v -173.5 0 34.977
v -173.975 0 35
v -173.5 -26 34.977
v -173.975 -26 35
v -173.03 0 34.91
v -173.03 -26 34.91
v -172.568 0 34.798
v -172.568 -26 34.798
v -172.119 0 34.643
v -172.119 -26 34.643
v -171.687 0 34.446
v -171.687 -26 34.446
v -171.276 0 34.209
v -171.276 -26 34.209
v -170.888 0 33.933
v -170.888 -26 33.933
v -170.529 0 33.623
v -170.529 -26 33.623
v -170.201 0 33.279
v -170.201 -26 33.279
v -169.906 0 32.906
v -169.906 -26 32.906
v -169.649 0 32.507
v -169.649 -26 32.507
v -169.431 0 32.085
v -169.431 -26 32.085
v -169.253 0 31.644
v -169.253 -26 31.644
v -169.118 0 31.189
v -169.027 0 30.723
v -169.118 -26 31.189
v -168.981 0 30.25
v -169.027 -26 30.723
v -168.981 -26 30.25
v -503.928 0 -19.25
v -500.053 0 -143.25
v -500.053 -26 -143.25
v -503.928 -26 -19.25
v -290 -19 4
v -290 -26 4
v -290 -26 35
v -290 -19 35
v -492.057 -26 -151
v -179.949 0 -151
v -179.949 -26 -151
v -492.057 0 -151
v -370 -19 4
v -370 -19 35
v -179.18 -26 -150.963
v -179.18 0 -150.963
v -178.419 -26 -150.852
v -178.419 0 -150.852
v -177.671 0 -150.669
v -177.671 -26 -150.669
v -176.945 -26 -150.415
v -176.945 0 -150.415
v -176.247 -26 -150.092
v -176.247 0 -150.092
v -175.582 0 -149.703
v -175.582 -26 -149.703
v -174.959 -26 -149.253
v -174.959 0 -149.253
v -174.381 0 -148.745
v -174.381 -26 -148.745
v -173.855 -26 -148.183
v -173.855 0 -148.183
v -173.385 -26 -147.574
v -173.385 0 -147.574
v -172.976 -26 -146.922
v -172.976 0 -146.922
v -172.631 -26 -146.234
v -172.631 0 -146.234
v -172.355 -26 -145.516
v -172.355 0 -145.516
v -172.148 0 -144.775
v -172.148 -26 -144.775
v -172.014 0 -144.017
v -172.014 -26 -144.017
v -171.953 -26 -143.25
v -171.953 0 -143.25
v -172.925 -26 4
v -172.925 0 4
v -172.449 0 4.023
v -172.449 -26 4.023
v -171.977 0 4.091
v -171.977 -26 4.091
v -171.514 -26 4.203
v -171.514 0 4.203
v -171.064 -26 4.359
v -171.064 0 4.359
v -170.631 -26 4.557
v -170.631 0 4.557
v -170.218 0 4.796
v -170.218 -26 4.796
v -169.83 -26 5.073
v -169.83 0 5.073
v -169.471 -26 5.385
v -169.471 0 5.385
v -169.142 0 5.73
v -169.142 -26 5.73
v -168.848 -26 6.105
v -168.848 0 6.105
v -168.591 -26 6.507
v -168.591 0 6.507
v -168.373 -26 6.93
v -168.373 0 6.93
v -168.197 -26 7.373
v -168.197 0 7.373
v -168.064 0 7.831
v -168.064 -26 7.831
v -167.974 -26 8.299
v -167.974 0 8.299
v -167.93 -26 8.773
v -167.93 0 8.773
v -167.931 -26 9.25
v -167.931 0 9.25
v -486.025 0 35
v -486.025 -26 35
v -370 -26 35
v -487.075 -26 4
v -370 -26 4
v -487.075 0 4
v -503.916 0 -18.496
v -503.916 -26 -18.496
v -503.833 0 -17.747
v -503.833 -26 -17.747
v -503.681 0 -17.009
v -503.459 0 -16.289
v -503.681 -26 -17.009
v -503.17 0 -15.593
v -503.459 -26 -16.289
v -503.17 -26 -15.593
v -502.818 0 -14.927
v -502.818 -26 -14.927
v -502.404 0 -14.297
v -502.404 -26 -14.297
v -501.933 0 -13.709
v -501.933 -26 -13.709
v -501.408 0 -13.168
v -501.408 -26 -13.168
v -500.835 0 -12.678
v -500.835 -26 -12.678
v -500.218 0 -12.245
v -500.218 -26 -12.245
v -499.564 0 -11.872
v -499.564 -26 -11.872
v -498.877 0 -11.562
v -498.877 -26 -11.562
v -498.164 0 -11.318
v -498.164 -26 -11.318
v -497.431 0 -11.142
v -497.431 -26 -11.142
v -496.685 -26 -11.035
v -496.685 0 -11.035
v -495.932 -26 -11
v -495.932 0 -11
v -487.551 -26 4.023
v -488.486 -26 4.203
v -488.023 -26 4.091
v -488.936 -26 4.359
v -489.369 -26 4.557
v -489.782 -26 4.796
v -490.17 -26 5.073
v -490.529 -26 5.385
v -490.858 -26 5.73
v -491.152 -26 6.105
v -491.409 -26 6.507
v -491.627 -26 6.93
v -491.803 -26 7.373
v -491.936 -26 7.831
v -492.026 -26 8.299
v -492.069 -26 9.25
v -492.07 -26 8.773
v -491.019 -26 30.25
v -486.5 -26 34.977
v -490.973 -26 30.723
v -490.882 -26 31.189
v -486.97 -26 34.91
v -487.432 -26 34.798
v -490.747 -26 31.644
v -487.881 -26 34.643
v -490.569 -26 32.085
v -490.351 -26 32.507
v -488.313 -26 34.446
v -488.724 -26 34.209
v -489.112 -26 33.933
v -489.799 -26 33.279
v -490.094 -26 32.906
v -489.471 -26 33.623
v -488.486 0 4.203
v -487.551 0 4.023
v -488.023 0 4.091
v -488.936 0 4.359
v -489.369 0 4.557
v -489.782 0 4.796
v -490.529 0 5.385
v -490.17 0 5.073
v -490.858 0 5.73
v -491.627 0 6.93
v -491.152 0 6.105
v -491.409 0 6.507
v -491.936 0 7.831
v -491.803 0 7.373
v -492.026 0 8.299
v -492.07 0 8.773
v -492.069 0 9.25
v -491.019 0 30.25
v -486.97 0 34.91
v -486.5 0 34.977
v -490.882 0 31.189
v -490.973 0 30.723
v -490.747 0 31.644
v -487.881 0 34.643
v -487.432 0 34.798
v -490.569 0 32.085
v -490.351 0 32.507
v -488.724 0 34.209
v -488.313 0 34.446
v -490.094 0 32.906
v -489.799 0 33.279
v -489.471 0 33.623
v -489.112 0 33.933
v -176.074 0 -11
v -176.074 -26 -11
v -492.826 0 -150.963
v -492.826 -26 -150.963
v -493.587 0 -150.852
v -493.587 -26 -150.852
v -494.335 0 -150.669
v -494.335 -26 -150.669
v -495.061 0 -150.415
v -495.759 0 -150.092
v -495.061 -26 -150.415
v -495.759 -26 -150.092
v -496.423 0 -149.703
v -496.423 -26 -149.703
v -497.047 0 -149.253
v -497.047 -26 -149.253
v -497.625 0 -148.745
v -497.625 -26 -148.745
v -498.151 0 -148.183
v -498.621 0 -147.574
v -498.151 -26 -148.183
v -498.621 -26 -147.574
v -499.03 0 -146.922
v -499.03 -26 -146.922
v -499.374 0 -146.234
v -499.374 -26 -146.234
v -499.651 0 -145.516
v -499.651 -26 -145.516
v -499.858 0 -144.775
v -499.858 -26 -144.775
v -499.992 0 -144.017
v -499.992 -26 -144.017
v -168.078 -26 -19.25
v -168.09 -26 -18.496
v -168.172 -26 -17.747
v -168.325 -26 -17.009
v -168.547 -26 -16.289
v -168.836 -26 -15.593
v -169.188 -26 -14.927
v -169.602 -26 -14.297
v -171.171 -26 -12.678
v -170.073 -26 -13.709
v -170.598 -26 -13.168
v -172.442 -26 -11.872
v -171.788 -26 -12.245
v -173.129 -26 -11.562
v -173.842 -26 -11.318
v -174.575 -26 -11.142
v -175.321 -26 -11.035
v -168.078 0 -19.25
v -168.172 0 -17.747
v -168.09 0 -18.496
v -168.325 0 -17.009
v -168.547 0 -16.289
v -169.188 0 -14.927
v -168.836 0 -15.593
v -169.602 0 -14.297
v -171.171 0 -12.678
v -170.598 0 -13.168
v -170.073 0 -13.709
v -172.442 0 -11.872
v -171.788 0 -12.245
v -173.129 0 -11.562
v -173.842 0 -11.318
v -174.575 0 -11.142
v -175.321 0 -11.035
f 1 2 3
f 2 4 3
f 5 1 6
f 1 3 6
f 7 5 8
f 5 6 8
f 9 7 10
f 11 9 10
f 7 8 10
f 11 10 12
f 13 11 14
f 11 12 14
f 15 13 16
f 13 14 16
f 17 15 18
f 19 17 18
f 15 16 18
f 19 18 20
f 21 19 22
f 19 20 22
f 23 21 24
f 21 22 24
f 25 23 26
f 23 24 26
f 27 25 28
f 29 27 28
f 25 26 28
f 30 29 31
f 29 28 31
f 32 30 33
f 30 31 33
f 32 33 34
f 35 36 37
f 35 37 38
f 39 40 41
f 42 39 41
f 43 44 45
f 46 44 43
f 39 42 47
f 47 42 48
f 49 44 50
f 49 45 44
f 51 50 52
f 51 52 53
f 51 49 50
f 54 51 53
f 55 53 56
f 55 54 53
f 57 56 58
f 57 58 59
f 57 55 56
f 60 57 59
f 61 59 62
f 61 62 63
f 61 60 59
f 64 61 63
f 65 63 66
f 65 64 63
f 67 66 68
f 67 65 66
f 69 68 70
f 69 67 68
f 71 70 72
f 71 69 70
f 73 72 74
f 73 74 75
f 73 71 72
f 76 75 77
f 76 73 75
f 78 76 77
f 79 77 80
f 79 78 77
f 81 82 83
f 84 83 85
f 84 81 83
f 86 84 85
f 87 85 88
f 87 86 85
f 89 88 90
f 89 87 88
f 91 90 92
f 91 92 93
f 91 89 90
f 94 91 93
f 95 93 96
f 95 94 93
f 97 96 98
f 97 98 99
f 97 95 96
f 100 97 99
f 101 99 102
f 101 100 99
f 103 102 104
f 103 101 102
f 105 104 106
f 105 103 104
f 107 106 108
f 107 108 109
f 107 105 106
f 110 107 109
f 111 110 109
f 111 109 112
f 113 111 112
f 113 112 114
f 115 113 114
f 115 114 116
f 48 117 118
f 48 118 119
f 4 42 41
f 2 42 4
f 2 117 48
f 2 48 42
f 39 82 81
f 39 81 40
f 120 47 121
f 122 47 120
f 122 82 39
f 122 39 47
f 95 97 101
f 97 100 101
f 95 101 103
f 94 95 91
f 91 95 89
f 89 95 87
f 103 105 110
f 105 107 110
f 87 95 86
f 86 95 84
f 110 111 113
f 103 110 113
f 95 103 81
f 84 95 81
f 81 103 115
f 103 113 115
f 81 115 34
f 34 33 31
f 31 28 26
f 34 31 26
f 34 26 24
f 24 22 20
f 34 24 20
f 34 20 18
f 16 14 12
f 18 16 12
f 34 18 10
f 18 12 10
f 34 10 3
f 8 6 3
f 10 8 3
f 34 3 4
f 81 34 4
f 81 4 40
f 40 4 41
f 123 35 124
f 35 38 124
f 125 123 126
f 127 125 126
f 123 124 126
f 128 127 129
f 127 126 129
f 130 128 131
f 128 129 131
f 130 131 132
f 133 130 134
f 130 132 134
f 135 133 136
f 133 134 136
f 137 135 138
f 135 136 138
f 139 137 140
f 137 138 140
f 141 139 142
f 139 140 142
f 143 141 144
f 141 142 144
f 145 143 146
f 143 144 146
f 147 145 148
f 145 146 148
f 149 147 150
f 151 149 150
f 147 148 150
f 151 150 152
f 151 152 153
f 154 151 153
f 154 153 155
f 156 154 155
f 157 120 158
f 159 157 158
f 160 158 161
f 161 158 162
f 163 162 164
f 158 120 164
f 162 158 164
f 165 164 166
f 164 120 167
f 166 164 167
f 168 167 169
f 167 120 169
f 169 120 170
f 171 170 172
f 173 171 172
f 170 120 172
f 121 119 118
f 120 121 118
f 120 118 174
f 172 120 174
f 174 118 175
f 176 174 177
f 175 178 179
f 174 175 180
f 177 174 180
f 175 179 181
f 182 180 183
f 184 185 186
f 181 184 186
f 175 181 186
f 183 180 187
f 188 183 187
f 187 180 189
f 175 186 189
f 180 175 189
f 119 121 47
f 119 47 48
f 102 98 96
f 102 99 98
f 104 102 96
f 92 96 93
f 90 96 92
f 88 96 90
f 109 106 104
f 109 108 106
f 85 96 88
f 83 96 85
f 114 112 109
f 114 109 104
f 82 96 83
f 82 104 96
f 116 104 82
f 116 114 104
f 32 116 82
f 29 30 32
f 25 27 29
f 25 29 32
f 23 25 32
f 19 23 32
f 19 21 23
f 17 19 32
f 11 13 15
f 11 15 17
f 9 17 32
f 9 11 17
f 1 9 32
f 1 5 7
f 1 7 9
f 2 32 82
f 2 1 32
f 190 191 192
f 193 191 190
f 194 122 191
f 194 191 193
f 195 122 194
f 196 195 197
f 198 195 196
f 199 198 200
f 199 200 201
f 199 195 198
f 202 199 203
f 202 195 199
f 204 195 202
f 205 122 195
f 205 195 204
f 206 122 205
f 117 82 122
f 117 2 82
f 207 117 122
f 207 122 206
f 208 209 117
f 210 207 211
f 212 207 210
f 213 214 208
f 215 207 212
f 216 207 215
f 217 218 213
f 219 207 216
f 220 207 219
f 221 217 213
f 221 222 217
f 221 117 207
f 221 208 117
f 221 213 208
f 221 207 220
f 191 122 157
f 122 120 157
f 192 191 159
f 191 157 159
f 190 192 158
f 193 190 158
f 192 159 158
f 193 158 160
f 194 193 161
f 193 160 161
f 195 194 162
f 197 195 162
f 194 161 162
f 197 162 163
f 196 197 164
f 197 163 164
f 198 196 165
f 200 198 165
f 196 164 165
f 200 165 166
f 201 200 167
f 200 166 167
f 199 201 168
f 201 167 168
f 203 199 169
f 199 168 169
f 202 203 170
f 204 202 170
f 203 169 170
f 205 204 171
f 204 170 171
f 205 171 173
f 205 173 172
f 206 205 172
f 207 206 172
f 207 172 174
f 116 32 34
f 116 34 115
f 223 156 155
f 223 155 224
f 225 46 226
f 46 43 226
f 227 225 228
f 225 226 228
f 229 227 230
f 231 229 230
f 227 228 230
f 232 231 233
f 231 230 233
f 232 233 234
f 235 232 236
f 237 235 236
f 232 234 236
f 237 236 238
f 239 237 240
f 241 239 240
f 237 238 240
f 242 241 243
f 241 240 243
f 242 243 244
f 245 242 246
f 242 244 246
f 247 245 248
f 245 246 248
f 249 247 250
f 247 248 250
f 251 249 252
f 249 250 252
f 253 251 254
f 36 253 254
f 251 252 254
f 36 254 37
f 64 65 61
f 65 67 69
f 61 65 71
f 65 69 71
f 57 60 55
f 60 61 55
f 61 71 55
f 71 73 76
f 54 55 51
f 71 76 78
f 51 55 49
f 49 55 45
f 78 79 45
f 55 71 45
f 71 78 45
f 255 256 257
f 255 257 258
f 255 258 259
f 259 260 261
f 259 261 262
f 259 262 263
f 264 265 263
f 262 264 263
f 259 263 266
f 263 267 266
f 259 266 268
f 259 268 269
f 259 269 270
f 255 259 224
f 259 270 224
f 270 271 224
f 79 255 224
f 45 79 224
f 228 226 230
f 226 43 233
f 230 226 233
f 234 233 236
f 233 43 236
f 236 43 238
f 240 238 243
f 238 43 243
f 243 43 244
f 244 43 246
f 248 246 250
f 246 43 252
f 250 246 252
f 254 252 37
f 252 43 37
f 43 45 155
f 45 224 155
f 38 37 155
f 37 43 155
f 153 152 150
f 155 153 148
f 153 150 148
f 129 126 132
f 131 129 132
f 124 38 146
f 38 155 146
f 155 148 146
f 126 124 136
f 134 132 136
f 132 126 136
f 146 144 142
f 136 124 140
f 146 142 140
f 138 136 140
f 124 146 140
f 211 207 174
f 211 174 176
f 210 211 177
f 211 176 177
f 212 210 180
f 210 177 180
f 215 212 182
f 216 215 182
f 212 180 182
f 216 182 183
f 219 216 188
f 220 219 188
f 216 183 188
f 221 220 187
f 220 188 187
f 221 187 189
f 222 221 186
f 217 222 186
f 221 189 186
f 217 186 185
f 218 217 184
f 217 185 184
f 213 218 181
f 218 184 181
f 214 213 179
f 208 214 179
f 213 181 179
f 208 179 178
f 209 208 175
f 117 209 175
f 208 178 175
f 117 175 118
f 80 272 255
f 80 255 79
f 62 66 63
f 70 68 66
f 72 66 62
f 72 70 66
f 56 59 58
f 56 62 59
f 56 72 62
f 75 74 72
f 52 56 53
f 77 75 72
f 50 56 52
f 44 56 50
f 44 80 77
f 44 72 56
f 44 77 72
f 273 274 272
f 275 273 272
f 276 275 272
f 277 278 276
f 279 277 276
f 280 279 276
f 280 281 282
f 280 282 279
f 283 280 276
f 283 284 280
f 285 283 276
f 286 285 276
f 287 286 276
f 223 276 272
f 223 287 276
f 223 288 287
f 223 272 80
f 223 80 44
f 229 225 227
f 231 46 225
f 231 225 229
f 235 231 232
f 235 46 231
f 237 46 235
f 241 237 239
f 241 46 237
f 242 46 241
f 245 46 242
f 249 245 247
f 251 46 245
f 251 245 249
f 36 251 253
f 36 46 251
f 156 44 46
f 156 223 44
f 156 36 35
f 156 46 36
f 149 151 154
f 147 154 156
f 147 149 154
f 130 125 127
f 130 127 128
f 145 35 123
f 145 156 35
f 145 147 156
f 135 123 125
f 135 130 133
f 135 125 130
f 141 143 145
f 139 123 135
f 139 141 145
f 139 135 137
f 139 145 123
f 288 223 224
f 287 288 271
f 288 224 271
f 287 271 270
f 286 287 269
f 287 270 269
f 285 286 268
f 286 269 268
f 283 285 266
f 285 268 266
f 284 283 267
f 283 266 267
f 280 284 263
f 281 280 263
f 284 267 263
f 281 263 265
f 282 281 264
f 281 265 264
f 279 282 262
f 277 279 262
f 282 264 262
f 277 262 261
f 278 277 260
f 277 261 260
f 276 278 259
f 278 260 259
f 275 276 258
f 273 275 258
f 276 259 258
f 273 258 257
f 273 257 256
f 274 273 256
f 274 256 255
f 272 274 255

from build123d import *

# Parameters (mm, degrees)
F2_DEPTH  = 26
F4_DEPTH  = 26
F5_R      = 5
F6_W      = 80
F6_H      = 36
F7_DEPTH  = 7
F8_R      = 8
F11_W     = 342.5
F11_H     = 418.889449735
F12_DEPTH = 26.001


with BuildPart() as f2:
    # F1 (on Front) → F2 (new body)
    with BuildSketch(Plane.XZ):
        Polygon((-157.8051775685, -151), (-100.5, -151), (100.5, -151), (152.5, -151), (169.8110355137, -151), (174.1860355137, -11), (-162.1801775685, -11), (-159.6801775685, -91), align=None)
    extrude(amount=F2_DEPTH)

    # F8
    f8_edges = [f2.edges().sort_by_distance(p)[0] for p in [
        (169.811036, -13, -151),
        (-162.180178, -13, -11),
        (174.186036, -13, -11),
        (-157.805178, -13, -151),
    ]]
    fillet(f8_edges, radius=F8_R)


with BuildPart() as f4:
    # F3 (on Front) → F4 (new body)
    with BuildSketch(Plane.XZ):
        Polygon((-162.3312617041, 4), (162.3312617041, 4), (160.7812617041, 35), (-160.7812617041, 35), align=None)
    extrude(amount=F4_DEPTH)

    # F5
    f5_edges = [f4.edges().sort_by_distance(p)[0] for p in [
        (-160.781262, -13, 35),
        (-162.331262, -13, 4),
        (160.781262, -13, 35),
        (162.331262, -13, 4),
    ]]
    fillet(f5_edges, radius=F5_R)

    # F6 (on face) → F7 (cut)
    with BuildSketch(Plane.XZ.offset(26)):
        with Locations((0, 17)):
            Rectangle(F6_W, F6_H)
    extrude(amount=-F7_DEPTH, mode=Mode.SUBTRACT)


with BuildPart() as f10_1:
    # F10: instance of F4
    add(f4.part.mirror(Plane.YZ.offset(-165)))


with BuildPart() as f10_2:
    # F10: instance of F2
    add(f2.part.mirror(Plane.YZ.offset(-165)))


with BuildPart() as f12_tool:
    # F11 (on Front) → F12 (new body, through all)
    with BuildSketch(Plane.XZ):
        with Locations((6.25, 0)):
            Rectangle(F11_W, F11_H)
    extrude(amount=F12_DEPTH)


with BuildPart() as f2_1:
    add(f2.part)

    # F12: cut by f12_tool
    add(f12_tool.part, mode=Mode.SUBTRACT)


with BuildPart() as f4_1:
    add(f4.part)

    # F12: cut by f12_tool
    add(f12_tool.part, mode=Mode.SUBTRACT)


solid = Compound([f10_1.part, f10_2.part])
